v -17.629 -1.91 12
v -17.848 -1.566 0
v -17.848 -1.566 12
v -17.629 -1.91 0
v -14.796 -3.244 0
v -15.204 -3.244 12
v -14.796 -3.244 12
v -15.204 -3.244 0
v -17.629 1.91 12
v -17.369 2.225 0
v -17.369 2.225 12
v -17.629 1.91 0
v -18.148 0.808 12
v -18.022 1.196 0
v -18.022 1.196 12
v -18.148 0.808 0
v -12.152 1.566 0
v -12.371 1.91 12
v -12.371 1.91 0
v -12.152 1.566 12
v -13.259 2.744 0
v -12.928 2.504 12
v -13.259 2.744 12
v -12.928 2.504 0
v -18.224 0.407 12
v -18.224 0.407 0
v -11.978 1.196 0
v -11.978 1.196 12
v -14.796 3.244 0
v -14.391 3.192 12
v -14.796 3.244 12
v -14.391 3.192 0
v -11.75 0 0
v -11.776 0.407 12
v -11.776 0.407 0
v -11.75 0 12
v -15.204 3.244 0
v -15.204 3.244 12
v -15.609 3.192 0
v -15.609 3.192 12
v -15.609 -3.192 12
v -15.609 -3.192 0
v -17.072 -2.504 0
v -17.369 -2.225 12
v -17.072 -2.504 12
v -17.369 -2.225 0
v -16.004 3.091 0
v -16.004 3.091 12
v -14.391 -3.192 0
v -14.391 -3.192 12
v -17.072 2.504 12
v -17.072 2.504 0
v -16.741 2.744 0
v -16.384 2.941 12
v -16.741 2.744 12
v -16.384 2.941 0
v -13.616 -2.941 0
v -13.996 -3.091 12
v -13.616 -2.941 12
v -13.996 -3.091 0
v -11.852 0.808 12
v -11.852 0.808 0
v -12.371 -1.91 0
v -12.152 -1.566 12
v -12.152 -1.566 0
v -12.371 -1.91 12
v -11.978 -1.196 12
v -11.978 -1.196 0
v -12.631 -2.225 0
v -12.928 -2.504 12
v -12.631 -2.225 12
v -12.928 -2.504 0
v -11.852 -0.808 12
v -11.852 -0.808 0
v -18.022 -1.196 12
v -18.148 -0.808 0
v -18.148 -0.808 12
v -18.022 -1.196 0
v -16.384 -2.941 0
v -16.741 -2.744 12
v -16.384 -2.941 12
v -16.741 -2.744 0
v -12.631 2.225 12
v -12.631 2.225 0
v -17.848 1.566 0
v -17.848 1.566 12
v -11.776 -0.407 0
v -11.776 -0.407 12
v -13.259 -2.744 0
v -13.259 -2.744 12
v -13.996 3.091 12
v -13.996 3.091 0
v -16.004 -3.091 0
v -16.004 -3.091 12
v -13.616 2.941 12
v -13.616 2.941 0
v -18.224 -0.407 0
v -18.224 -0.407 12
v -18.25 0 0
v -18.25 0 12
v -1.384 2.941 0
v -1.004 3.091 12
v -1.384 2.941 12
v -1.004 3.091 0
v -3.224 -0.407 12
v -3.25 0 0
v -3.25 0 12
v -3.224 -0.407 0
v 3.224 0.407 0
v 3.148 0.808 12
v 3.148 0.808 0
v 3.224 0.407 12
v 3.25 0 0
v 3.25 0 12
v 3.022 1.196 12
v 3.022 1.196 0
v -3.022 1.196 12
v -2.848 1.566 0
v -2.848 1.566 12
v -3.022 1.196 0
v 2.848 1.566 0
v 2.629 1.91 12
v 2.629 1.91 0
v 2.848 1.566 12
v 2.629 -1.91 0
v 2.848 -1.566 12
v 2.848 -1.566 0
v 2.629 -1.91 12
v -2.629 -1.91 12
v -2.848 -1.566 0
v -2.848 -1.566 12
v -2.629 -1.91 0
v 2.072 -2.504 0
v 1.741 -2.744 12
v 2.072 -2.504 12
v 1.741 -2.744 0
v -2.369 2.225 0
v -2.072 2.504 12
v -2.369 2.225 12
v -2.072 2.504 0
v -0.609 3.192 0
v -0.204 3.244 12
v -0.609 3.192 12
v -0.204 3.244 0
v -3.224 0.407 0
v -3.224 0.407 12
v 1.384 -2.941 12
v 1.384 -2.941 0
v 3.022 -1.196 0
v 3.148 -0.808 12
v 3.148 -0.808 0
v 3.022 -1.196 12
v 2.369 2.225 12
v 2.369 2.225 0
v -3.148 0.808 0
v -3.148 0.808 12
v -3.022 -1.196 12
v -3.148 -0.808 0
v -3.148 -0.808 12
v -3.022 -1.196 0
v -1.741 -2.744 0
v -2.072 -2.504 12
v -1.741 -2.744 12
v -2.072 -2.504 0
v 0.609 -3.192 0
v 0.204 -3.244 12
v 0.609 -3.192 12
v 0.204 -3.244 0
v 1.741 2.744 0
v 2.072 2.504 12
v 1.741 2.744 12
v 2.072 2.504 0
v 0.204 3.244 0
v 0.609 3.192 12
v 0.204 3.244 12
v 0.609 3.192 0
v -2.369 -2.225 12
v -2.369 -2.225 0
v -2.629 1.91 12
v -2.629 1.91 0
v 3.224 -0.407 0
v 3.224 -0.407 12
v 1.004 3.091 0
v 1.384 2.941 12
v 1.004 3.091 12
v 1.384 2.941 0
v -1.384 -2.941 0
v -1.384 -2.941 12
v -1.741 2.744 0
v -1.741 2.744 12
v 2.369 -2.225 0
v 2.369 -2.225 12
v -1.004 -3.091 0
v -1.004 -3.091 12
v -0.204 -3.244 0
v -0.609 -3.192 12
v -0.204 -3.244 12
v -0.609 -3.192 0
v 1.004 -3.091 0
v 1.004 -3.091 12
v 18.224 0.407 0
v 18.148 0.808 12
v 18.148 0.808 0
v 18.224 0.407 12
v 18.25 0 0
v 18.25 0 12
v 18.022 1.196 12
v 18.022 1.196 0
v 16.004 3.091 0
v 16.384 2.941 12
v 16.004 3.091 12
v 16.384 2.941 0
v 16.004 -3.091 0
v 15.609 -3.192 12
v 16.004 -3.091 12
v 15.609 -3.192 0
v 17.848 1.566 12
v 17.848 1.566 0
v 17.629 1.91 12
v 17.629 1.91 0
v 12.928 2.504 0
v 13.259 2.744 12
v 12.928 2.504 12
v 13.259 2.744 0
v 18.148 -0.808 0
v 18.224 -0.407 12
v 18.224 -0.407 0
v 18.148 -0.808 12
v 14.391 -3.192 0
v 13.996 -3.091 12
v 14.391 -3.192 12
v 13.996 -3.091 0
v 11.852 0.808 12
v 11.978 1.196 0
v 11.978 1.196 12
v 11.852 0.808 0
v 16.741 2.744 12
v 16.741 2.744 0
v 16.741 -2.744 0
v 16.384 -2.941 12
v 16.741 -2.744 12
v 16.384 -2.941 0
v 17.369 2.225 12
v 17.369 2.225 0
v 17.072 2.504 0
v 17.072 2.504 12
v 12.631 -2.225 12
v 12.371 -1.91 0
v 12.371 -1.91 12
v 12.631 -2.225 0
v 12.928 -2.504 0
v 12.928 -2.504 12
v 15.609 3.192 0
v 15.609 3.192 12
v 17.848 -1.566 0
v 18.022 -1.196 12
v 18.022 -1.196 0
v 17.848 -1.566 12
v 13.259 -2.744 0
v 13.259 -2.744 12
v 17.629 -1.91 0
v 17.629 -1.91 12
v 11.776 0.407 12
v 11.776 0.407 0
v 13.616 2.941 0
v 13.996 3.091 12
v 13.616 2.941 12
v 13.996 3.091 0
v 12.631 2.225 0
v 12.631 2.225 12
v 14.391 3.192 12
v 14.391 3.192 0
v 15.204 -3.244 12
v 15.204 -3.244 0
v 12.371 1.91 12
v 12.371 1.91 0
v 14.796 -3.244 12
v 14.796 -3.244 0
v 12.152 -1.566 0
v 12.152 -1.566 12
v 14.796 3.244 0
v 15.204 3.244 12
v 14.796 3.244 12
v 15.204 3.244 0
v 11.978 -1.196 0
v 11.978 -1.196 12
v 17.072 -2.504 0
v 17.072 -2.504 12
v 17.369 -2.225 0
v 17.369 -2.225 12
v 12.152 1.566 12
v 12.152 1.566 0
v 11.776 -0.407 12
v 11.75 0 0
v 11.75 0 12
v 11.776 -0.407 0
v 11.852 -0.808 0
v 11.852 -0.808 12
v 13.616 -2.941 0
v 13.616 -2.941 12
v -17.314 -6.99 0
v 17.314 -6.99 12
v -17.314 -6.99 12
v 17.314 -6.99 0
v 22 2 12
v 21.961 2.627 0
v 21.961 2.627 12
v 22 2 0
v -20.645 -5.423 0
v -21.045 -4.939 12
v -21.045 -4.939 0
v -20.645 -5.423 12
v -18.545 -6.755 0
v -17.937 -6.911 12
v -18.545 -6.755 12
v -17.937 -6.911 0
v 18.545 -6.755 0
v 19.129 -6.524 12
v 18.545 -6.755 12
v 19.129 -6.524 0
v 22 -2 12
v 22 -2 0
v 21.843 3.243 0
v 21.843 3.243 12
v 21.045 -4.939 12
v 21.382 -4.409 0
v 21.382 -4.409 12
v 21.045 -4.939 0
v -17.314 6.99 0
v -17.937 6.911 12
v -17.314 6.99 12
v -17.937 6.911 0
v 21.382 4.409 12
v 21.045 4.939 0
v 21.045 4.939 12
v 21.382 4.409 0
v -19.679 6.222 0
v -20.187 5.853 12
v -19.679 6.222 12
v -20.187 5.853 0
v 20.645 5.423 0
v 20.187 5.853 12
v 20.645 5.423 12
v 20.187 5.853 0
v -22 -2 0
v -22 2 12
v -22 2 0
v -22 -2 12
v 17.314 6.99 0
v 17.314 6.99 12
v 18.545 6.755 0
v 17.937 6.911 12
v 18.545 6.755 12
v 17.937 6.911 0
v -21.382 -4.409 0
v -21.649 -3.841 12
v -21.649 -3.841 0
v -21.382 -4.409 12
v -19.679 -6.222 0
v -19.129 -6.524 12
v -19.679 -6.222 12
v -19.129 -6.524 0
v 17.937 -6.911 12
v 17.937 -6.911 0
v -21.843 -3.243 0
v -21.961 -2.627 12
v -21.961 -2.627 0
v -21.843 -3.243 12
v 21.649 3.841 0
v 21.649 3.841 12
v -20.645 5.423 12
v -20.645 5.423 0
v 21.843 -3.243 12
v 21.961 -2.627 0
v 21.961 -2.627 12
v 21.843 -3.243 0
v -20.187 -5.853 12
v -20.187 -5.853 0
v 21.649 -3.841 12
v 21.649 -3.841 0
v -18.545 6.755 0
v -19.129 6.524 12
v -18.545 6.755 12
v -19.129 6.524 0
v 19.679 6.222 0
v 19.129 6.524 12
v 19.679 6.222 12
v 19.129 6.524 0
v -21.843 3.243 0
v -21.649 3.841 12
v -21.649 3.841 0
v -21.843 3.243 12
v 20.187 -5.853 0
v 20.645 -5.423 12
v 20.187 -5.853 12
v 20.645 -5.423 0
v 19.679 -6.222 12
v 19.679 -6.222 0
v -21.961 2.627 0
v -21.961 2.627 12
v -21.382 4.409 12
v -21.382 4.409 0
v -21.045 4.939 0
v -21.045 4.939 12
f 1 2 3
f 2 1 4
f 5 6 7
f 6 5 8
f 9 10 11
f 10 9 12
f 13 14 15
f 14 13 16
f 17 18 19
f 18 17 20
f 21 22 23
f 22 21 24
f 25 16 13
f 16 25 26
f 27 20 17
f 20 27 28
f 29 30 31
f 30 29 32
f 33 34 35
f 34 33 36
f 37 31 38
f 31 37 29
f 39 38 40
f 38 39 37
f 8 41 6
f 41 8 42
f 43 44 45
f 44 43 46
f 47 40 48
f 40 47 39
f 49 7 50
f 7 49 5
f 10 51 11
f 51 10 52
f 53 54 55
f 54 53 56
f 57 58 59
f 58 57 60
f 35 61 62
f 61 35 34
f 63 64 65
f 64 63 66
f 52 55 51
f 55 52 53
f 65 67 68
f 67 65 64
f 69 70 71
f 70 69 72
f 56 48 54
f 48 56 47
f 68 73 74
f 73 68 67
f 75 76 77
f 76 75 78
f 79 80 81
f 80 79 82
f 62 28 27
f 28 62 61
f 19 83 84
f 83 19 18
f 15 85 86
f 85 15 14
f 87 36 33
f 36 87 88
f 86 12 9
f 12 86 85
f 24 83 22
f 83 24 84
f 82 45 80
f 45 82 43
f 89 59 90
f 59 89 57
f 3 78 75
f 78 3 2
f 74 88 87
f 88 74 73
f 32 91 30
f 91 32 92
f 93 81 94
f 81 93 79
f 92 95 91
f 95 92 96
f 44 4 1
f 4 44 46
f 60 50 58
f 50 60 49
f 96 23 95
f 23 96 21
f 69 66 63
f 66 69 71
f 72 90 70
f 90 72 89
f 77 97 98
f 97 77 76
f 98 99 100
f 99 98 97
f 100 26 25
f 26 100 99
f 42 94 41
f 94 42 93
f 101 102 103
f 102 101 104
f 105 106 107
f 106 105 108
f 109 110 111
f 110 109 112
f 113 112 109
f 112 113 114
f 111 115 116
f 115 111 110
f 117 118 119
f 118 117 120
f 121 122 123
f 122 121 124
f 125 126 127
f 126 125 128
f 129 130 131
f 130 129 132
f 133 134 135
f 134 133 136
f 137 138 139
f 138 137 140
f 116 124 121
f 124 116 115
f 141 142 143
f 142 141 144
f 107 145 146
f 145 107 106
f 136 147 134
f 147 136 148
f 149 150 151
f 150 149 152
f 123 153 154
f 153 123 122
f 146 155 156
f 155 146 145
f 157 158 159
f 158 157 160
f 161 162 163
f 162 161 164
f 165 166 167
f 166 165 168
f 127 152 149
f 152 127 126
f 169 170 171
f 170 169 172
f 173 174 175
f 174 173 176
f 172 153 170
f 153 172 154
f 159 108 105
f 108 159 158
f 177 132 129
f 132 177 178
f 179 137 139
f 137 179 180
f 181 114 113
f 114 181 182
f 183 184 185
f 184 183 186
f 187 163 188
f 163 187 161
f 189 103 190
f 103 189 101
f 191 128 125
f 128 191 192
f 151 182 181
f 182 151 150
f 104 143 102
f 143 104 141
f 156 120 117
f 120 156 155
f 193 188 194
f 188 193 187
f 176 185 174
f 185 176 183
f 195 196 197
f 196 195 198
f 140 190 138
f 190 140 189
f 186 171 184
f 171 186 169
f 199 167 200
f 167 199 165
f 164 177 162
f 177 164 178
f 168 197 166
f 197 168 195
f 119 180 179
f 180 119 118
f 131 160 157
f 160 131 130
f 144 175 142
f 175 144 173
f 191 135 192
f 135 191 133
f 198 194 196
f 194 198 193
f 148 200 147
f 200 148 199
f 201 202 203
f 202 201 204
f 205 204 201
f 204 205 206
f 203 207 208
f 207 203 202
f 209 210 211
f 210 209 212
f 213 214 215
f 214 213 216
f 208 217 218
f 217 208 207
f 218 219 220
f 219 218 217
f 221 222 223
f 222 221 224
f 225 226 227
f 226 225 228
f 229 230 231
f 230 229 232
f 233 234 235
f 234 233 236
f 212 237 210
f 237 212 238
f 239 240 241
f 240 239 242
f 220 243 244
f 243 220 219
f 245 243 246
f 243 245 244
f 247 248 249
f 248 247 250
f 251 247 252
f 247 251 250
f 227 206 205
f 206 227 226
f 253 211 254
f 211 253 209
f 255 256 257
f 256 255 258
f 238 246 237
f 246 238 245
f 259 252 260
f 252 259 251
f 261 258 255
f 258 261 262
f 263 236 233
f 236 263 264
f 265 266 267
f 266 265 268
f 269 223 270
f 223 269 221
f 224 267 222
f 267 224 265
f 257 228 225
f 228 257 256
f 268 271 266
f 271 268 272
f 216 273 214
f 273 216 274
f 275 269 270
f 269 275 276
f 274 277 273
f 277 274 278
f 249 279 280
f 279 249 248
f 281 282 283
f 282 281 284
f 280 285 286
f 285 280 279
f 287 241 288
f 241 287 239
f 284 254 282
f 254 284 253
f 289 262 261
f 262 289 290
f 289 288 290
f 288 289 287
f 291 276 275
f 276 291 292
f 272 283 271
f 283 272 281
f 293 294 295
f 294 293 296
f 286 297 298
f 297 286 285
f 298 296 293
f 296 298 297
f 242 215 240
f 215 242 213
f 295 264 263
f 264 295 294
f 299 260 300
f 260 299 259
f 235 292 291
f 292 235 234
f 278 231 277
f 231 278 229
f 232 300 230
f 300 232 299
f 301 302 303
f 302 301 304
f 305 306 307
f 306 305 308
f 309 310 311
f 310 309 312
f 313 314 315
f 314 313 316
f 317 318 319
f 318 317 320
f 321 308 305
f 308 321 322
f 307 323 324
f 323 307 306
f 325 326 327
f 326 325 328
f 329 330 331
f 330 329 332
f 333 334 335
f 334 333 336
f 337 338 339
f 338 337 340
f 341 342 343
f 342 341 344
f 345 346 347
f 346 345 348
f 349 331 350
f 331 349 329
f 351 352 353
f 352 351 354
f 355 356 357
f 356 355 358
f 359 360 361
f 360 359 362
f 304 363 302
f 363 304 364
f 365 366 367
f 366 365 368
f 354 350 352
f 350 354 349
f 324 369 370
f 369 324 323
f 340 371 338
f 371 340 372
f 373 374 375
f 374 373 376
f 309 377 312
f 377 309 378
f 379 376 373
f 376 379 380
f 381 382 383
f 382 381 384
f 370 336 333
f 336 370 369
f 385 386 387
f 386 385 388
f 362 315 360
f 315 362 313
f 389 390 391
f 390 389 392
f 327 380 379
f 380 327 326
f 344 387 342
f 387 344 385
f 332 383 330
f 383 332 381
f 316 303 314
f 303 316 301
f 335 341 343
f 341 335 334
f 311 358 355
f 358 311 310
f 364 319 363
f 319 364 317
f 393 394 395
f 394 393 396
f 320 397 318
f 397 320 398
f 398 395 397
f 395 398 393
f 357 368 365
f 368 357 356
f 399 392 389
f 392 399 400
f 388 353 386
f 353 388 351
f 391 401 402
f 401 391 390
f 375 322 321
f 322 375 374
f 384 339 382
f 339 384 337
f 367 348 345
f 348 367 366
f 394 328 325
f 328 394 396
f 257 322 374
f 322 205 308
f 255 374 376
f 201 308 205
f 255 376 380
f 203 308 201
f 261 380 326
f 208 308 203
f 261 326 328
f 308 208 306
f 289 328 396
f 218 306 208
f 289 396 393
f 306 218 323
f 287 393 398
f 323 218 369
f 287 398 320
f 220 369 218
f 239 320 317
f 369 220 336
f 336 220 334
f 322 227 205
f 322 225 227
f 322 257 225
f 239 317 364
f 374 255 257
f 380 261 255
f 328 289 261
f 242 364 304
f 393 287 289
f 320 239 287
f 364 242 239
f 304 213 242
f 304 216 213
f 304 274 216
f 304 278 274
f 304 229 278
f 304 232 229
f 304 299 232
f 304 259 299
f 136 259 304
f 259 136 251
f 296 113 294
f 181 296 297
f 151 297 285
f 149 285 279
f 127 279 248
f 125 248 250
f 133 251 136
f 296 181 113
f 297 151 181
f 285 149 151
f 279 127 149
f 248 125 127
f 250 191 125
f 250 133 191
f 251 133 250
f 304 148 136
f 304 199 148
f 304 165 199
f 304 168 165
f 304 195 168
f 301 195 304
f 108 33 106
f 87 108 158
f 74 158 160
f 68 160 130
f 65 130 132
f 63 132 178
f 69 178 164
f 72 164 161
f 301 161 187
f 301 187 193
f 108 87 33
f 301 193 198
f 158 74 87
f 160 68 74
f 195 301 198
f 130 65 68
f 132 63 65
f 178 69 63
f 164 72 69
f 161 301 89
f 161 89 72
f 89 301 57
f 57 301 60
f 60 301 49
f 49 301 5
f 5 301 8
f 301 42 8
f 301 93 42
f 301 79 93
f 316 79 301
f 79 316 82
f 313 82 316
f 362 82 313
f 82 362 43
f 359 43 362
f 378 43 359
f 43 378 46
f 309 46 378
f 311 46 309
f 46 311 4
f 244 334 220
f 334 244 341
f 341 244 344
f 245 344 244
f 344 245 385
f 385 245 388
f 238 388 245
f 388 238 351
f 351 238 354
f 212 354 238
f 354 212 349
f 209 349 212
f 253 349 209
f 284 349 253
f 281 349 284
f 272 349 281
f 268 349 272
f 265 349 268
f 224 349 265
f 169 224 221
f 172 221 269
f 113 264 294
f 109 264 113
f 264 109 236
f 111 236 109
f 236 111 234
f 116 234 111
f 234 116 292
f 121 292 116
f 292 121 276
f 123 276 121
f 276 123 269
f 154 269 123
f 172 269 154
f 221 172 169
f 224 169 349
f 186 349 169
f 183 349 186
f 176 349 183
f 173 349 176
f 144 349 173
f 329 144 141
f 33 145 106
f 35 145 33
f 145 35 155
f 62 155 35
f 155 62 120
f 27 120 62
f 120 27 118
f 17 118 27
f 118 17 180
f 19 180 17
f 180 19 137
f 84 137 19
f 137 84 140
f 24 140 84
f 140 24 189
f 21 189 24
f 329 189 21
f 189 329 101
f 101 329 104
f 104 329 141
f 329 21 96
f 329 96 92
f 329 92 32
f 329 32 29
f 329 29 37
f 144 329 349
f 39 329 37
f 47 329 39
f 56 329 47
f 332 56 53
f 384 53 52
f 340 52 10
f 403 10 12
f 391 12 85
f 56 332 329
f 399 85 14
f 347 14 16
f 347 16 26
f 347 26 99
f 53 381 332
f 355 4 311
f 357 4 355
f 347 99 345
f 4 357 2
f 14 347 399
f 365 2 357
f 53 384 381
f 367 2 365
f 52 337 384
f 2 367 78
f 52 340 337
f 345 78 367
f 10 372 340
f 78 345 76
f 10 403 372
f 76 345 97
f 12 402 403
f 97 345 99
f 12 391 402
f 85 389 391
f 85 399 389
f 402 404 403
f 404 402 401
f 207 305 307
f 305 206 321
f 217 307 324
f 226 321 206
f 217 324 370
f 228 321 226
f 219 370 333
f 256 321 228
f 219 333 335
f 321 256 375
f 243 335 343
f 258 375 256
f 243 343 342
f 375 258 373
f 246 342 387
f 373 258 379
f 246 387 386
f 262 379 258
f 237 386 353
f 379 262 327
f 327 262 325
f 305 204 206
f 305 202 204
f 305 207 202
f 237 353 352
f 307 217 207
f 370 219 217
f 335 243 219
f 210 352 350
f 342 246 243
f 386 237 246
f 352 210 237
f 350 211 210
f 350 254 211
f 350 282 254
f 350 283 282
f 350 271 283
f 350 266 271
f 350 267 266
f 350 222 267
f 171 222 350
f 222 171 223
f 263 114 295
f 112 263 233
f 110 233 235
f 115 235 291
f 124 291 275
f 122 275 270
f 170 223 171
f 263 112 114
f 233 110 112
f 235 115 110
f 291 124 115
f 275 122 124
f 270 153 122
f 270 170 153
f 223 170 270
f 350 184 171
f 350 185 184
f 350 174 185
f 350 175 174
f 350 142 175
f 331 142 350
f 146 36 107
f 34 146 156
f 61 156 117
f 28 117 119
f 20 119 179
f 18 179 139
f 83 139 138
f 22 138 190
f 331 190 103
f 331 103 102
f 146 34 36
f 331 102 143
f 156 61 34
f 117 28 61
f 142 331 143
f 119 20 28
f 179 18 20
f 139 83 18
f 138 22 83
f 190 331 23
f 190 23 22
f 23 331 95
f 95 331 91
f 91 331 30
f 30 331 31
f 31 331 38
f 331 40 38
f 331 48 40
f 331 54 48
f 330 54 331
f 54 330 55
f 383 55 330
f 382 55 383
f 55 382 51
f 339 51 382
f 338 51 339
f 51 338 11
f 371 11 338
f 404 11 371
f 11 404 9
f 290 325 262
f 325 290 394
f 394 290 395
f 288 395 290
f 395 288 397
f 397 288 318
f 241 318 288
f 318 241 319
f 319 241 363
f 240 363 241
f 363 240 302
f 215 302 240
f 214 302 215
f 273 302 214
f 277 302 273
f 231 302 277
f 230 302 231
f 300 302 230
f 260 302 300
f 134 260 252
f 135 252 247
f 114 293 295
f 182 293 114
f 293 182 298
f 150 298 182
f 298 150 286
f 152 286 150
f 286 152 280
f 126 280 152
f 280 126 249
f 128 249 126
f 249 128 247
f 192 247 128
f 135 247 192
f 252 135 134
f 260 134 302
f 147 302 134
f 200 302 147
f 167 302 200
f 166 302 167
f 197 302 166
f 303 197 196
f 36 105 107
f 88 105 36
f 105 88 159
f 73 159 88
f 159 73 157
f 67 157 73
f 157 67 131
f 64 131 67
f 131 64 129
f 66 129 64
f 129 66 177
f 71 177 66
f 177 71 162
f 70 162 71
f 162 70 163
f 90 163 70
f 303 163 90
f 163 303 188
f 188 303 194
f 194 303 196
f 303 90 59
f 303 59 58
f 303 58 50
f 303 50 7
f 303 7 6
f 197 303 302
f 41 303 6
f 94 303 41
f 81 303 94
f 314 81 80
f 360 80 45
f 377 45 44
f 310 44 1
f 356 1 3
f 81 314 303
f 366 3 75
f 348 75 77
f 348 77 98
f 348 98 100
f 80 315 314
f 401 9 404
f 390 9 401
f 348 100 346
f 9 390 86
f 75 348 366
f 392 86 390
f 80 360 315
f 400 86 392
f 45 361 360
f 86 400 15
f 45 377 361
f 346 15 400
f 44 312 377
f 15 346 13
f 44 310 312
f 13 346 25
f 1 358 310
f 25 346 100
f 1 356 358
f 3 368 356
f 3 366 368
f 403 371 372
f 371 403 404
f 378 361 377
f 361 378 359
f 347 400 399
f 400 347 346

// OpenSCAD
$fn = 50;


difference() {
	union() {
		hull() {
			translate(v = [-17.0000000000, 2.0000000000, 0]) {
				cylinder(h = 12, r = 5);
			}
			translate(v = [17.0000000000, 2.0000000000, 0]) {
				cylinder(h = 12, r = 5);
			}
			translate(v = [-17.0000000000, -2.0000000000, 0]) {
				cylinder(h = 12, r = 5);
			}
			translate(v = [17.0000000000, -2.0000000000, 0]) {
				cylinder(h = 12, r = 5);
			}
		}
	}
	union() {
		translate(v = [-15.0000000000, 0.0000000000, 0]) {
			translate(v = [0, 0, -100]) {
				cylinder(h = 200, r = 3.2500000000);
			}
		}
		translate(v = [0, 0, -100]) {
			cylinder(h = 200, r = 3.2500000000);
		}
		translate(v = [15.0000000000, 0.0000000000, 0]) {
			translate(v = [0, 0, -100]) {
				cylinder(h = 200, r = 3.2500000000);
			}
		}
	}
}
